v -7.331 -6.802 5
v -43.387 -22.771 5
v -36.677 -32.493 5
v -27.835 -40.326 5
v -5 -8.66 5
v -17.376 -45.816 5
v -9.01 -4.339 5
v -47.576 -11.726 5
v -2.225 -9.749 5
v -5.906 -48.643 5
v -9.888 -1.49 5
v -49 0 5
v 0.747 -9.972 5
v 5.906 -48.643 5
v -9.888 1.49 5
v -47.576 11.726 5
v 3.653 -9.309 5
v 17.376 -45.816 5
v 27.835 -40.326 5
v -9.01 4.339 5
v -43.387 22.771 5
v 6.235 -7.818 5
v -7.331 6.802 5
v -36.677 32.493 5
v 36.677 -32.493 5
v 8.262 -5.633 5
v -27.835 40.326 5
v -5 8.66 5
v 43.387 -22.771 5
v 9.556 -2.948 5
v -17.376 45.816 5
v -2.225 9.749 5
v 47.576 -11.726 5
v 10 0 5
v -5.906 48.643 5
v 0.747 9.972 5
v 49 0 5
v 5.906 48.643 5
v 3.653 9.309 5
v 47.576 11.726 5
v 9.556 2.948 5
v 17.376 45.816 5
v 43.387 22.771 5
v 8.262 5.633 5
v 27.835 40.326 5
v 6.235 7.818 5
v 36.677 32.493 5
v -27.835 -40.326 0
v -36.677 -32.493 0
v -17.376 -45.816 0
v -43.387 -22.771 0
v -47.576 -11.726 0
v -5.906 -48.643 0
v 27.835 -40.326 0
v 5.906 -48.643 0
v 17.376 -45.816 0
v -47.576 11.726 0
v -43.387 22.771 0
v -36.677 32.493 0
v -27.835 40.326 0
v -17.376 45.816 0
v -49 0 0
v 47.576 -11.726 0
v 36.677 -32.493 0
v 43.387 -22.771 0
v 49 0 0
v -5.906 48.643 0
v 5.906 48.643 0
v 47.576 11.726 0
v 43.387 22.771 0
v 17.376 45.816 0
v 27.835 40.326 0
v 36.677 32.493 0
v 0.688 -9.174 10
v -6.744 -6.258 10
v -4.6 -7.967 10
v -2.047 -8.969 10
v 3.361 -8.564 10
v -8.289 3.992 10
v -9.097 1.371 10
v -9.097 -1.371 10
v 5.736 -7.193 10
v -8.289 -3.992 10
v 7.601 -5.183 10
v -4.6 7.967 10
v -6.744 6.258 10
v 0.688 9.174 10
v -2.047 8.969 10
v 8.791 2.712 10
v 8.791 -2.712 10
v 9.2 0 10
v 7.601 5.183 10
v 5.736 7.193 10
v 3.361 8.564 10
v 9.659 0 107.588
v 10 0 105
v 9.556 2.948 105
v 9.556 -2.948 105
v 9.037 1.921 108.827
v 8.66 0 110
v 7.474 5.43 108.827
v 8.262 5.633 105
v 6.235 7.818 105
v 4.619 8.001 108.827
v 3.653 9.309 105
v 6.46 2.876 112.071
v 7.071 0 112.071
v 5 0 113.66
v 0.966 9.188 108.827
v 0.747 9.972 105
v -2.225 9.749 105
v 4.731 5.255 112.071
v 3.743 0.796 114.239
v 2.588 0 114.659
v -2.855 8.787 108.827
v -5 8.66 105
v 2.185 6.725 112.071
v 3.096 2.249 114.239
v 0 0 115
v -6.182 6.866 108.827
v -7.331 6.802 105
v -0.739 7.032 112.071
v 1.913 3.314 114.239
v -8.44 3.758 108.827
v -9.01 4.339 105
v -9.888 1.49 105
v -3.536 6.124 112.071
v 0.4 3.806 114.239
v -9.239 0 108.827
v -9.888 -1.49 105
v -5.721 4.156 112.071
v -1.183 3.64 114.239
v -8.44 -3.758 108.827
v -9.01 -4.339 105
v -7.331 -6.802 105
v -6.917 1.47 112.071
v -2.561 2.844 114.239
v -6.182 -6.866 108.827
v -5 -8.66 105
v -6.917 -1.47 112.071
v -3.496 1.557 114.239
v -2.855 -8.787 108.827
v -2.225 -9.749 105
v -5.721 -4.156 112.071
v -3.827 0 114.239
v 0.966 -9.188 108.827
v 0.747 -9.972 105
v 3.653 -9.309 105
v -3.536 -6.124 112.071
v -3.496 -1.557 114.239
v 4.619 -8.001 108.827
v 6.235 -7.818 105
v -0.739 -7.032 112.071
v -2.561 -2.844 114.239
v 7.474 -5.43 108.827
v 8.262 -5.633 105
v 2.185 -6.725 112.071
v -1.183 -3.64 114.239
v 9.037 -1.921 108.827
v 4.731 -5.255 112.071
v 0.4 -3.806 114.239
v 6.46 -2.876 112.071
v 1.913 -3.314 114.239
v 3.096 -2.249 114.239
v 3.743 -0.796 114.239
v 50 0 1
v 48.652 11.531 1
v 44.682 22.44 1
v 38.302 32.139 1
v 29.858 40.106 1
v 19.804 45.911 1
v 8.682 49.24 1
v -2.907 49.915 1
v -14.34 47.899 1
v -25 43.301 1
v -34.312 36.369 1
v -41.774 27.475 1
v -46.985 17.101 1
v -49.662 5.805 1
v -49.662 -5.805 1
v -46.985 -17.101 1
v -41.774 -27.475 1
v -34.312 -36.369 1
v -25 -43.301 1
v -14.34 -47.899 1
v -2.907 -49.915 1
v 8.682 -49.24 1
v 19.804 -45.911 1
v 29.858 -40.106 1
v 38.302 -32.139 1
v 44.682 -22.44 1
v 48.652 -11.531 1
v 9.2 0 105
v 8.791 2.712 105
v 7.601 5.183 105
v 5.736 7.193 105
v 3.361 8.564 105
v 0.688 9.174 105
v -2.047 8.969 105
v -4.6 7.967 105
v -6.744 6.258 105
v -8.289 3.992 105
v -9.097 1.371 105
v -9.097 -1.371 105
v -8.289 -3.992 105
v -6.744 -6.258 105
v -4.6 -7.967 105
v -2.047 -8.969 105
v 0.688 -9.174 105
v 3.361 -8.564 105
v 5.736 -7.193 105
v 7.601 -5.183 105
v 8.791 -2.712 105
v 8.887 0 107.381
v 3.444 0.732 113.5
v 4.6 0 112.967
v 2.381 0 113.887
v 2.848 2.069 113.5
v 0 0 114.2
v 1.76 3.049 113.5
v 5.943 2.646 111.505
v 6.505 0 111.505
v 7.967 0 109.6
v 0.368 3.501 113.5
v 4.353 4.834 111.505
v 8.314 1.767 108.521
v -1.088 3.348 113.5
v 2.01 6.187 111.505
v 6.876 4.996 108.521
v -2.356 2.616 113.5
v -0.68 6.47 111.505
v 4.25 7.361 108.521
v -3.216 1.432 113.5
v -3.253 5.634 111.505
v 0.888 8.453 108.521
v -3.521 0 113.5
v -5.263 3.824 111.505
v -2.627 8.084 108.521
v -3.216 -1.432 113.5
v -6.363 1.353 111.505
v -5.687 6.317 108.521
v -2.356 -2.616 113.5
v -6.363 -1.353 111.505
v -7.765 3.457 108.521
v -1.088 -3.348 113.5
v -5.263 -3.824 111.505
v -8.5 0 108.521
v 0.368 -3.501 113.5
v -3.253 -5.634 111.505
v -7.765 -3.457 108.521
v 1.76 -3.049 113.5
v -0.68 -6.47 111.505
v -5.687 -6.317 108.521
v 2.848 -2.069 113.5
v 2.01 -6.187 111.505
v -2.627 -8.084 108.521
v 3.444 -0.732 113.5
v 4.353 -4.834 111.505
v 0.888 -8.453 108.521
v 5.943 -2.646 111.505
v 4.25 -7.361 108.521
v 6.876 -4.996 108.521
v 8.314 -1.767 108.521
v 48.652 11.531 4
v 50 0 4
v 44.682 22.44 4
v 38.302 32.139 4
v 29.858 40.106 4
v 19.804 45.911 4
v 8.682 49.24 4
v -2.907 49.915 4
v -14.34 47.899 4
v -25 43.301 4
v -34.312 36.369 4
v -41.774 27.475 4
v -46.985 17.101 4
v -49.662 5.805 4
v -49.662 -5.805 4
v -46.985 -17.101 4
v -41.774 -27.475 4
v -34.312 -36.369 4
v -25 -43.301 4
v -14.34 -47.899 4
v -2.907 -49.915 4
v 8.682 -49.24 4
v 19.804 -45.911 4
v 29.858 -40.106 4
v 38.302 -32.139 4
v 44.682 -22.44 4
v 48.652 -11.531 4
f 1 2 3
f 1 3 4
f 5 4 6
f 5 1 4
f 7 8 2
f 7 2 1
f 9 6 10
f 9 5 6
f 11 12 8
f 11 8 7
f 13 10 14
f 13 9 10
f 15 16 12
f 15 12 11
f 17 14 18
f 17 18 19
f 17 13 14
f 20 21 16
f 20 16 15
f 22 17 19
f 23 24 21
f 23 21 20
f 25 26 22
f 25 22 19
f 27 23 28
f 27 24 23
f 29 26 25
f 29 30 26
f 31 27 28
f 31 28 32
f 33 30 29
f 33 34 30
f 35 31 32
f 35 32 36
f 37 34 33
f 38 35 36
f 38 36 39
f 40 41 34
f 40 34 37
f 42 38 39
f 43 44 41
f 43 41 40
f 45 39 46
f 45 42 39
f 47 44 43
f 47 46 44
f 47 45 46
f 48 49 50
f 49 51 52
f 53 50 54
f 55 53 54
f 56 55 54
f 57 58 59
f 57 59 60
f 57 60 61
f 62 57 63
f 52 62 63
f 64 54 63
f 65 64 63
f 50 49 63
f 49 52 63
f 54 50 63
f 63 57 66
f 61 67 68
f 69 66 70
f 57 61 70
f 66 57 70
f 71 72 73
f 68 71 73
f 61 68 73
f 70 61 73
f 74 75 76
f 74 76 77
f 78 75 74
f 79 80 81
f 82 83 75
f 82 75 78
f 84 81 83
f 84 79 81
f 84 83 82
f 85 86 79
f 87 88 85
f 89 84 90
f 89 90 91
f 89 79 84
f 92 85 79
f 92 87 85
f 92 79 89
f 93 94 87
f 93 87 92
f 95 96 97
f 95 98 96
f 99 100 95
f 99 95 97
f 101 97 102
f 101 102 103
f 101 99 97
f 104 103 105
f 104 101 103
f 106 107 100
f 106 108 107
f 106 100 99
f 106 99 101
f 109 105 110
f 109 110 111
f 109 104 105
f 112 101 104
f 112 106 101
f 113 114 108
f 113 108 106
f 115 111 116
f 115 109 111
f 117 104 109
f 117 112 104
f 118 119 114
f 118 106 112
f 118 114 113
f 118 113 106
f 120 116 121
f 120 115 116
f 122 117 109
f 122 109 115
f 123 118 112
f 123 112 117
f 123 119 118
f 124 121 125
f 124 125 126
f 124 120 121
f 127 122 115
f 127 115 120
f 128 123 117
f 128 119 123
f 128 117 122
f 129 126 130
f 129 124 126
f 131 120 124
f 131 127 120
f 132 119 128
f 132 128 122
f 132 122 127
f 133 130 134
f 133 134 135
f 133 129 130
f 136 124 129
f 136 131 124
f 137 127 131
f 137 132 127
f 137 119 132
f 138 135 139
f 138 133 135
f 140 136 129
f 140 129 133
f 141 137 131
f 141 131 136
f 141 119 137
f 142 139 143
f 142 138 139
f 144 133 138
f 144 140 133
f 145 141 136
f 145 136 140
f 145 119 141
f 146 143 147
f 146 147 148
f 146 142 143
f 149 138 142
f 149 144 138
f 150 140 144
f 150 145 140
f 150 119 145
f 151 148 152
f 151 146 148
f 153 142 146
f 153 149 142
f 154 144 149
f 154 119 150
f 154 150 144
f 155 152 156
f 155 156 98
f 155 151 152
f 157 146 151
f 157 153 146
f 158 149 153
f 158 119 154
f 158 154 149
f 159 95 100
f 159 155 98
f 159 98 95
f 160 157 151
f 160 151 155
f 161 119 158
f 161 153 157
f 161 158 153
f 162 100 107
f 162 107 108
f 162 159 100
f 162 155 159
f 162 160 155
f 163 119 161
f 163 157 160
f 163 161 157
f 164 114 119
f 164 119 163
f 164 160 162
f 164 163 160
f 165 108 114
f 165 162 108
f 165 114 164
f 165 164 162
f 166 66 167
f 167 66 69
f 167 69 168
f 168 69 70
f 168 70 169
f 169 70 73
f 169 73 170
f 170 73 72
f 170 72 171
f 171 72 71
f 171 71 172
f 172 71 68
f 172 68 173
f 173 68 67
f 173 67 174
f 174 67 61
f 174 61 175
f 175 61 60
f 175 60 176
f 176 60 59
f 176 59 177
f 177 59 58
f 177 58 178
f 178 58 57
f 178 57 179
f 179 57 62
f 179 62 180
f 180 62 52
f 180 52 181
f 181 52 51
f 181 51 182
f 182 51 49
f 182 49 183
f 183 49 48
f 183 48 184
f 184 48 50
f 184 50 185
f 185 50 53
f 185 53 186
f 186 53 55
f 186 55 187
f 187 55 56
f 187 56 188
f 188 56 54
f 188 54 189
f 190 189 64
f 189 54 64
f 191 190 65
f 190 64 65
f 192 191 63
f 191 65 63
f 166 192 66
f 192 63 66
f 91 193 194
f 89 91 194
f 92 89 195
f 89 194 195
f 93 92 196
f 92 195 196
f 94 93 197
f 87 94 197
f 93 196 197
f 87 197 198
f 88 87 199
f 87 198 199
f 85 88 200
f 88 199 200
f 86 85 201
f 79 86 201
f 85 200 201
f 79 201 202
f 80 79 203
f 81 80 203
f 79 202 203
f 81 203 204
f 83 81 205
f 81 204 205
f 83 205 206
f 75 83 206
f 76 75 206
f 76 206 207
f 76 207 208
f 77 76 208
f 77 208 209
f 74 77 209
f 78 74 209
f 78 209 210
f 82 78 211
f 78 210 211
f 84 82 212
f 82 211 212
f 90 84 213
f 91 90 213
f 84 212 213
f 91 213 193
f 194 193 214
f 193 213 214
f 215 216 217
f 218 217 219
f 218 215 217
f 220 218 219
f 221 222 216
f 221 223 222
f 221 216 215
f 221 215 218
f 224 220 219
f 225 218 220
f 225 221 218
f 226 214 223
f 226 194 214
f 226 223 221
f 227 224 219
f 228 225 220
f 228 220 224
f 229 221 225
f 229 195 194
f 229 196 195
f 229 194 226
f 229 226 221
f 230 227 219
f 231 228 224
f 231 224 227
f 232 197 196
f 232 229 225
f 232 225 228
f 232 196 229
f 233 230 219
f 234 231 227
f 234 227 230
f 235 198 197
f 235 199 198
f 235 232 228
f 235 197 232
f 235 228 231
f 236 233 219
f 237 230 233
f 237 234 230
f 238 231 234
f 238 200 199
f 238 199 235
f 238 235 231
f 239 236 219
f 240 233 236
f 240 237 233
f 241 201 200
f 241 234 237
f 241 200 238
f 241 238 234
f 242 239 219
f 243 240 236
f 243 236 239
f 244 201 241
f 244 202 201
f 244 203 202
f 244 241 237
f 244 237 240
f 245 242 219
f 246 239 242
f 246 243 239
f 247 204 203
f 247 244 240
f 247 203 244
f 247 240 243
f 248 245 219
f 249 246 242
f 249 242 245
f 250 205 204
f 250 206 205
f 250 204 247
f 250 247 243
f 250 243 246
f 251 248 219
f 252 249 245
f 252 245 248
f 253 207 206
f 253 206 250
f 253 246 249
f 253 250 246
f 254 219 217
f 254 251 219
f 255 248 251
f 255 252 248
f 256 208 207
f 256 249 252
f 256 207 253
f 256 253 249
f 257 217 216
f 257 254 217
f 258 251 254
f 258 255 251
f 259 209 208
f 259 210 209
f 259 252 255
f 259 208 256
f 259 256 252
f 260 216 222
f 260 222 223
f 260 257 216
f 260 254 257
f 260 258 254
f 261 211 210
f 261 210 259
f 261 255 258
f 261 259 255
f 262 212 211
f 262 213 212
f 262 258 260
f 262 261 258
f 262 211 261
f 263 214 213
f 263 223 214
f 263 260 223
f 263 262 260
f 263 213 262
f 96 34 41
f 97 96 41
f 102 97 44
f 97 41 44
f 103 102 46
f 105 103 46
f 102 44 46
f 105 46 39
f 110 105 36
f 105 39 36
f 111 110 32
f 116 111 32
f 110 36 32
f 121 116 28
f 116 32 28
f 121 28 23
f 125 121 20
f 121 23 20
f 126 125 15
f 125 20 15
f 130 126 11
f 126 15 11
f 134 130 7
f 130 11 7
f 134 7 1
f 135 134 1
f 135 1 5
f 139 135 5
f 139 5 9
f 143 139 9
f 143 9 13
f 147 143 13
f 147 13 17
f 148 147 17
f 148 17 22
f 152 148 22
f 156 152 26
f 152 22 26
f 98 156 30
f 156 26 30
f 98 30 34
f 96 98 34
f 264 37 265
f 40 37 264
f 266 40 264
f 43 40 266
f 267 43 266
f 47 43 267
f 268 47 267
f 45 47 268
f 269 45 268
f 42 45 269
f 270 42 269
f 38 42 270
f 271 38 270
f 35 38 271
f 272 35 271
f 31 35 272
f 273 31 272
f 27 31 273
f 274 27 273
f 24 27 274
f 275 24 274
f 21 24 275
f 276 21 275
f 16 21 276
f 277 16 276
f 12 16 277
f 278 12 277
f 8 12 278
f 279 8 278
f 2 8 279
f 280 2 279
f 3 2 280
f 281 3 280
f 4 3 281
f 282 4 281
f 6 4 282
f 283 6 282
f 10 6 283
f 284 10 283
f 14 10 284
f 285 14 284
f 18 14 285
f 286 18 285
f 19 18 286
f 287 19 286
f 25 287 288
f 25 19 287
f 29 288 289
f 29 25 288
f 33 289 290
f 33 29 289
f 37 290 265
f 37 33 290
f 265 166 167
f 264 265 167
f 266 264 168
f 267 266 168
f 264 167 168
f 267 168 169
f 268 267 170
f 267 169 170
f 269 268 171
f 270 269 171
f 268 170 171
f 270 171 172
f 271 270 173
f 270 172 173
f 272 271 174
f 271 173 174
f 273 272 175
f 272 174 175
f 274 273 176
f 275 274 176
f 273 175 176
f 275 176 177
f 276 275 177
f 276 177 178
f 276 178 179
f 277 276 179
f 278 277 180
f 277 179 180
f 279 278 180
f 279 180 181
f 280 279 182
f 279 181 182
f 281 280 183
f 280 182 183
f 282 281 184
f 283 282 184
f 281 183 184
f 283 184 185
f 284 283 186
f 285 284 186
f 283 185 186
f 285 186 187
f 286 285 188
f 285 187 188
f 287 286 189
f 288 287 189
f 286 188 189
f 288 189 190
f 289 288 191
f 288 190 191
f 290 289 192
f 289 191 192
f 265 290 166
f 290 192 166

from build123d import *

# Parameters (mm, degrees)
F0_R     = 50
F1_DEPTH = 5
F2_R     = 10
F3_DEPTH = 100
F4_R     = 9.2
F5_DEPTH = 95
F6_SIZE  = 1


with BuildPart() as f1:
    # F0 (on Top) → F1 (new body)
    with BuildSketch(Plane.XY):
        Circle(F0_R)
    extrude(amount=F1_DEPTH)

    # F2 (on face) → F3 (join)
    with BuildSketch(Plane.XY.offset(5)):
        Circle(F2_R)
    extrude(amount=F3_DEPTH)

    # F4 (on face) → F5 (cut, through all)
    with BuildSketch(Plane.XY.offset(105)):
        Circle(F4_R)
    extrude(amount=-F5_DEPTH, mode=Mode.SUBTRACT)

    # F6
    f6_edges = [f1.edges().sort_by_distance(p)[0] for p in [
        (-50, 0, 5),
        (-50, 0, 0),
    ]]
    chamfer(f6_edges, length=F6_SIZE)

    # F7 (on Front) → F8 (revolve)
    with BuildSketch(Plane.XZ):
        with BuildLine():
            Line((9.2, 105), (10, 105))
            ThreePointArc((10, 105), (7.0710678119, 112.0710678119), (0, 115))
            Line((0, 115), (0, 114.2))
            ThreePointArc((0, 114.2), (6.5053823869, 111.5053823869), (9.2, 105))
        make_face()
    revolve(axis=Axis((0, 0, 109.6), (0, 0, 1)))


solid = f1.part
